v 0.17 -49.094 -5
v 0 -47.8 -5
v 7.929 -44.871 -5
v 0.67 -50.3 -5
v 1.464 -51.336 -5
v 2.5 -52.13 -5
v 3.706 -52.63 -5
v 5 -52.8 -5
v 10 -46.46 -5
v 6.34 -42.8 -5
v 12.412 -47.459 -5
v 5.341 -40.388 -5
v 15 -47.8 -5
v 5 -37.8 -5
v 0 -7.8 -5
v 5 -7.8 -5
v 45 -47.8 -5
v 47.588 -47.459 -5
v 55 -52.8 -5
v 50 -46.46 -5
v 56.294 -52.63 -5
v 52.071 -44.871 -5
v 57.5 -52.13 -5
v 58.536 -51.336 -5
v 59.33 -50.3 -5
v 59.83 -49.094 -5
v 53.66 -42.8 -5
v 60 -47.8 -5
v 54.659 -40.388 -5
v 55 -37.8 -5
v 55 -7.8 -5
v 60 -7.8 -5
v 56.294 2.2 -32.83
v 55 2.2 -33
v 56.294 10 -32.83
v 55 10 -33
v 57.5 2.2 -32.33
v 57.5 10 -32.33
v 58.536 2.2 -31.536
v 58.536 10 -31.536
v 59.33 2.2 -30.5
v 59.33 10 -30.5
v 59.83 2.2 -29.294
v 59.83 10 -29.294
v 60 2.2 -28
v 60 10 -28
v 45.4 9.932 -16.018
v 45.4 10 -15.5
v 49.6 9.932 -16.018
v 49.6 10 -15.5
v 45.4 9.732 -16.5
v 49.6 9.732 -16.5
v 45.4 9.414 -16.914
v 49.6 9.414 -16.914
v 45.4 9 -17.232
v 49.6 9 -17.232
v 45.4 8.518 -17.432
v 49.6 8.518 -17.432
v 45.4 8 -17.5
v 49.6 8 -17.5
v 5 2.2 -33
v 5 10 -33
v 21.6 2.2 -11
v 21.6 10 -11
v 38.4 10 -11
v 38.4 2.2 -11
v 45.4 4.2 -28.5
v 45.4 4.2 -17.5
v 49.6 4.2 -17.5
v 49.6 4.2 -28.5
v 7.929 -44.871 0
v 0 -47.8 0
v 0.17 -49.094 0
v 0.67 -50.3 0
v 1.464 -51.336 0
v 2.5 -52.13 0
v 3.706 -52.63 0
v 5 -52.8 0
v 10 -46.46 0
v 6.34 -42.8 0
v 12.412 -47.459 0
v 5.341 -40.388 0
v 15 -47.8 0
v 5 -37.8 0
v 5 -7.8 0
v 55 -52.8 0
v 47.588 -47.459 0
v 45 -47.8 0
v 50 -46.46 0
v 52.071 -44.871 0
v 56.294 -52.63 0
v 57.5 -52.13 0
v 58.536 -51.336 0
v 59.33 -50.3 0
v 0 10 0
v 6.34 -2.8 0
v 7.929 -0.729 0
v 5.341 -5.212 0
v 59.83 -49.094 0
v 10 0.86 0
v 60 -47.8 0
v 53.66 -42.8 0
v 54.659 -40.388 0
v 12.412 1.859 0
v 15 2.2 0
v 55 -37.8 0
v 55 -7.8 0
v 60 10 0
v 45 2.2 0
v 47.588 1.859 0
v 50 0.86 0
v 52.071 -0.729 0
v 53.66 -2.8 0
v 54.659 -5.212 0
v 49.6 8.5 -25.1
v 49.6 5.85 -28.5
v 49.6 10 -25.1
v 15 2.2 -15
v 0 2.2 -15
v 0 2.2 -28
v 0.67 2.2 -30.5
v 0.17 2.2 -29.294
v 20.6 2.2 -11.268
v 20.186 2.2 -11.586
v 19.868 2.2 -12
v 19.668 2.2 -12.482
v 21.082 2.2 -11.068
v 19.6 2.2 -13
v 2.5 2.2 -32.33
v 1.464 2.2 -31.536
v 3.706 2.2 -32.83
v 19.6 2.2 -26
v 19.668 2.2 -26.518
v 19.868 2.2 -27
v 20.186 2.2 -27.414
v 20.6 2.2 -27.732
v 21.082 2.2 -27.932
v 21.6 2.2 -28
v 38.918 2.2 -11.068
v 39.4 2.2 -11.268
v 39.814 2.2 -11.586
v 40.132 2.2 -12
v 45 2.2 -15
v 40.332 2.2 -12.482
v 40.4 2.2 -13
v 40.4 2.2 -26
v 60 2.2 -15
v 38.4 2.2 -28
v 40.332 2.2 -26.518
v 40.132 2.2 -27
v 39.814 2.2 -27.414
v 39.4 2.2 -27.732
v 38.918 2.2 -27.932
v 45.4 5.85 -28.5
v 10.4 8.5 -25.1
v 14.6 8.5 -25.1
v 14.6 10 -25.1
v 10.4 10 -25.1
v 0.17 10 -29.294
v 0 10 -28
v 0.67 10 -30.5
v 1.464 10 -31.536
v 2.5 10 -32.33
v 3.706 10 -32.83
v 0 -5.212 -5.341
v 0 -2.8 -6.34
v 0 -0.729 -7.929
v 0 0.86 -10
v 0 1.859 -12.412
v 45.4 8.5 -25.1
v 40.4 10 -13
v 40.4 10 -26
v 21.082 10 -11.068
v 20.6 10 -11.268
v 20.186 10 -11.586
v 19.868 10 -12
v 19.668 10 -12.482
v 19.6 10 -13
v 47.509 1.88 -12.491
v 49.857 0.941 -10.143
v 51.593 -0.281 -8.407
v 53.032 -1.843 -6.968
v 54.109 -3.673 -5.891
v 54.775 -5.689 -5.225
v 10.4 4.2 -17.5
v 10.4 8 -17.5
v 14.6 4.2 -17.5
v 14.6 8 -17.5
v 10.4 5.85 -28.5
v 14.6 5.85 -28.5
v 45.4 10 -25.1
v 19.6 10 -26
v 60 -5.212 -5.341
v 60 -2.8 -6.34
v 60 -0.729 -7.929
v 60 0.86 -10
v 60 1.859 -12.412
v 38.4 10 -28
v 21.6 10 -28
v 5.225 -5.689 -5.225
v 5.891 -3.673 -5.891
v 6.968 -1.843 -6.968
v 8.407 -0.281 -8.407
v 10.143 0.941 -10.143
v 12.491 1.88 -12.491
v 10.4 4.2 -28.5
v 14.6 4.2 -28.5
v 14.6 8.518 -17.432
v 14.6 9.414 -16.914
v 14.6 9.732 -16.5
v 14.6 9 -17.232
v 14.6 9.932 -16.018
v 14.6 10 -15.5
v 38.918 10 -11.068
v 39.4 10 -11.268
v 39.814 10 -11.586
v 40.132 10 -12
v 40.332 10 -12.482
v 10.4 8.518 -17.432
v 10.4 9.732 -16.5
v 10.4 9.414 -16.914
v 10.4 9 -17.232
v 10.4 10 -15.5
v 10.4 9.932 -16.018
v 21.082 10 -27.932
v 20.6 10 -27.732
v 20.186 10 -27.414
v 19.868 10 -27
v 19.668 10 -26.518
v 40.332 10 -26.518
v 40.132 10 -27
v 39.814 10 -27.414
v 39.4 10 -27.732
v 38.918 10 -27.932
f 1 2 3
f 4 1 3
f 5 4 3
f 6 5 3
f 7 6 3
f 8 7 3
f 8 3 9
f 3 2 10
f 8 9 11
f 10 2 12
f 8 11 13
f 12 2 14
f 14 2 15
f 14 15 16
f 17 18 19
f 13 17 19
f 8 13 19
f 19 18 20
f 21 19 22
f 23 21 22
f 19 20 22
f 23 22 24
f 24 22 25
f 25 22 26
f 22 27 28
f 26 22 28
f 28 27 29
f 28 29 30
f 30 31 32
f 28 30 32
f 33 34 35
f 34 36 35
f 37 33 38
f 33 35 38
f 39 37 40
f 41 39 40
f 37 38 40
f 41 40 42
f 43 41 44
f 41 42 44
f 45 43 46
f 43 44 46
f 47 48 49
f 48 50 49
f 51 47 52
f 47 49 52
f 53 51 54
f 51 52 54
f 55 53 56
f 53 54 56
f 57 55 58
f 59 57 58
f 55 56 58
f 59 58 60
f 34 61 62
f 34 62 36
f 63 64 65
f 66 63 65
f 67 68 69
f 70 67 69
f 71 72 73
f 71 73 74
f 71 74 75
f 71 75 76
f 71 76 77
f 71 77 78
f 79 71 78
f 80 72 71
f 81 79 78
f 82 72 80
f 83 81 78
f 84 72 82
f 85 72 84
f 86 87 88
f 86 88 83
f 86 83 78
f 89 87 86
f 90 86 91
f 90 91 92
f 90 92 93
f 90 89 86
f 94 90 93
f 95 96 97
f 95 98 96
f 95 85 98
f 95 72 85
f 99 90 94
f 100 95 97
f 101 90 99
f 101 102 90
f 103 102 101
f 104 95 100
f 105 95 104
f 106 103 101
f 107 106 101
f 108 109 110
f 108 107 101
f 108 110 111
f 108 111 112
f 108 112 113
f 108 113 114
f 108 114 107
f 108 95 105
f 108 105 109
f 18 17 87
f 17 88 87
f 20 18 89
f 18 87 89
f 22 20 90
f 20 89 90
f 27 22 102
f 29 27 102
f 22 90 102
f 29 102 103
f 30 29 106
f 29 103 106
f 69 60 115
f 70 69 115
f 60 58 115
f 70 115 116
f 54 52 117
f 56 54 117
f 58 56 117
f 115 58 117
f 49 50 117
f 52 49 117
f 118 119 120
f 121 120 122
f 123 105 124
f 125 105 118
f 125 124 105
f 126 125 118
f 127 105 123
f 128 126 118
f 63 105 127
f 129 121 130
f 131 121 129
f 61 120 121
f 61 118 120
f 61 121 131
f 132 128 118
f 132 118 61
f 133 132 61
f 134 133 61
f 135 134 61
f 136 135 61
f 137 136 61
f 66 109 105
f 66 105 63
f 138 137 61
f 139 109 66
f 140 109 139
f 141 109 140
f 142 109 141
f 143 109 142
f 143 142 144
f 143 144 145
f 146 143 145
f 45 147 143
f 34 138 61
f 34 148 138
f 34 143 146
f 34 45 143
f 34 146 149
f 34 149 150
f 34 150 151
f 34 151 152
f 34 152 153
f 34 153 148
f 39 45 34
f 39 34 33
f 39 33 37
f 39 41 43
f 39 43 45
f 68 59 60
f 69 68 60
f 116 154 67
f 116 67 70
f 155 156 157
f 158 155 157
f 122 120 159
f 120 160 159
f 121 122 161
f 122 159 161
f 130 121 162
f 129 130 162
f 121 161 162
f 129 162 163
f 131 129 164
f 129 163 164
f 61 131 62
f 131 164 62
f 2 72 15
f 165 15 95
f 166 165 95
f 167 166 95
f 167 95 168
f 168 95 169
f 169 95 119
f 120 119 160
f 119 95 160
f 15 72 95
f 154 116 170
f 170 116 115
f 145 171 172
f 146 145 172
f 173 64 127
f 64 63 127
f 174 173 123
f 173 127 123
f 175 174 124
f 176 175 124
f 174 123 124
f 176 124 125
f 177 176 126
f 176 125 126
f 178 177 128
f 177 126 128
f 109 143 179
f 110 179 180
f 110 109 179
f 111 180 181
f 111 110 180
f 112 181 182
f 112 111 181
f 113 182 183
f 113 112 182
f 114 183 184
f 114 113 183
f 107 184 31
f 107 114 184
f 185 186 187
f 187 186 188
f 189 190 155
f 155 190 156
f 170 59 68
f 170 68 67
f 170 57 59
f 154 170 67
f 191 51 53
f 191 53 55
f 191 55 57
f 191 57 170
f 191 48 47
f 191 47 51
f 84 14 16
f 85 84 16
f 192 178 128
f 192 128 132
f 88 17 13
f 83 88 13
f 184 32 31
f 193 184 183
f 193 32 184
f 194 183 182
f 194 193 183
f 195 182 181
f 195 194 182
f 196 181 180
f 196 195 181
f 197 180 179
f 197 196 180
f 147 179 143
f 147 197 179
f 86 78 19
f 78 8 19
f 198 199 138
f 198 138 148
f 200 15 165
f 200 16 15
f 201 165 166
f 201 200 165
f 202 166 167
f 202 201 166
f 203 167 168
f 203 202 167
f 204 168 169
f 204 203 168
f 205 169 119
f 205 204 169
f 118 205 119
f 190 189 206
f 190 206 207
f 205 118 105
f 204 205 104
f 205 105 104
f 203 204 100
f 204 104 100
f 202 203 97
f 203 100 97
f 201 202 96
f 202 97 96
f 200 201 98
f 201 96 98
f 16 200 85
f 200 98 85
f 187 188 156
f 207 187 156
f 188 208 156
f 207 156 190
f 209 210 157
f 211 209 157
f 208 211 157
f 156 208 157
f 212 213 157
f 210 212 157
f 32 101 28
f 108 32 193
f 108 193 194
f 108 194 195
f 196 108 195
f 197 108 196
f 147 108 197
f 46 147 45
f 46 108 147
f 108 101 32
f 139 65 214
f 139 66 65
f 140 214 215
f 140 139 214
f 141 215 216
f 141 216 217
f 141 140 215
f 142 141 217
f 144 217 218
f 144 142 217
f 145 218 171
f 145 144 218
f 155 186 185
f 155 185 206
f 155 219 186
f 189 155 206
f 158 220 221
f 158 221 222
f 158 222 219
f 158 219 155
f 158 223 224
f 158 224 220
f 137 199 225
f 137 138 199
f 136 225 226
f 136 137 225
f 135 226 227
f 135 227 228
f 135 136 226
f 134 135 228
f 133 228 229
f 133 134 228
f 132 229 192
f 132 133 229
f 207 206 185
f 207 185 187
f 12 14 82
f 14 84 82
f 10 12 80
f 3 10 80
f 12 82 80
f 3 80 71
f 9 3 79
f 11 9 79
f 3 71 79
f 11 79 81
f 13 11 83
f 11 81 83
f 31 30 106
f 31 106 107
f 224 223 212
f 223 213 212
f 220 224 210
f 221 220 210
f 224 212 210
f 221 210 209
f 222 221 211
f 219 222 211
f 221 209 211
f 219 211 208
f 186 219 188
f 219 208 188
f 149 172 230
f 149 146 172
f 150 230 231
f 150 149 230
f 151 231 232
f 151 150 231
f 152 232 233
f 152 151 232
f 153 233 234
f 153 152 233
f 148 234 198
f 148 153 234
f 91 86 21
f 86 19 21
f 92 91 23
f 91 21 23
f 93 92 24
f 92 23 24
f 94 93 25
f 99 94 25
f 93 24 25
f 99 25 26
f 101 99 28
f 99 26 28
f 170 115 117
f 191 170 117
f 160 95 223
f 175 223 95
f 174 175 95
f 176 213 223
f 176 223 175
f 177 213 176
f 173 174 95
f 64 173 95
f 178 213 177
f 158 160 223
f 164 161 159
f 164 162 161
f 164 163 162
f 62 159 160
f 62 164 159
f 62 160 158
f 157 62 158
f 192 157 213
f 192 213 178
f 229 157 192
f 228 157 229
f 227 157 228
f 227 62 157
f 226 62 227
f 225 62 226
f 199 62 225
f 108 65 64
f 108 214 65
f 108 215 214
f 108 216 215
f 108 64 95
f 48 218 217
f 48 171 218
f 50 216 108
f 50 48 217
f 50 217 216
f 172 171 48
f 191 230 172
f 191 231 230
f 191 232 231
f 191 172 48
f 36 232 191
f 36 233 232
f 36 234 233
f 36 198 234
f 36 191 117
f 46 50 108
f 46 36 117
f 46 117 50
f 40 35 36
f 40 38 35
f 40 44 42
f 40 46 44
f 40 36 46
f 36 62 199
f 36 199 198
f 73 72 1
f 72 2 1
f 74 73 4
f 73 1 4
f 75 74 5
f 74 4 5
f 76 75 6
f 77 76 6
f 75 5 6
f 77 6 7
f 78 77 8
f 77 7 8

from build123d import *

# Parameters (mm, degrees)
SKETCH1_W               = 60
SKETCH1_H               = 33
BOSS_EXTRUDE1_DEPTH     = 10
SKETCH2_W               = 4.2
SKETCH2_H               = 11
CUT_EXTRUDE1_DEPTH      = 5.8
BOSS_EXTRUDE2_START     = -45.4
BOSS_EXTRUDE2_DEPTH     = 55.8
SKETCH4_W               = 33
SKETCH4_H               = 2.2
CUT_EXTRUDE2_DEPTH      = 1
CUT_EXTRUDE2_DEPTH_BACK = 61
FILLET1_R               = 2
SKETCH7_W               = 20.8
SKETCH7_H               = 17
CUT_EXTRUDE4_DEPTH      = 16
FILLET2_R               = 2
BOSS_EXTRUDE4_START     = -7.8
SKETCH5_W               = 60
SKETCH5_H               = 5
BOSS_EXTRUDE4_DEPTH     = 55
SKETCH8_W               = 50
SKETCH8_H               = 50
CUT_EXTRUDE5_DEPTH      = 52.15
FILLET3_R               = 10
FILLET4_R               = 5
FILLET6_R               = 5


with BuildPart() as part:
    # Sketch1 → Boss-Extrude1 (new body)
    with BuildSketch(Plane(origin=(0, 0, 0), x_dir=(1, 0, 0), z_dir=(0, 1, 0))):
        with Locations((30, 16.5)):
            Rectangle(SKETCH1_W, SKETCH1_H)
    extrude(amount=BOSS_EXTRUDE1_DEPTH)

    # Sketch2 → Cut-Extrude1 (cut)
    with BuildSketch(Plane(origin=(0, 10, 0), x_dir=(1, 0, 0), z_dir=(0, 1, 0))):
        with Locations((12.5, 23)):
            Rectangle(SKETCH2_W, SKETCH2_H)
        with Locations((47.5, 23)):
            Rectangle(SKETCH2_W, SKETCH2_H)
    extrude(amount=-CUT_EXTRUDE1_DEPTH, mode=Mode.SUBTRACT)

    # Sketch3 → Boss-Extrude2 (add)
    with BuildSketch(Plane.ZY.offset(-14.6).offset(BOSS_EXTRUDE2_START)):
        Polygon((-28.5, 5.85), (-25.1, 8.5), (-25.1, 10), (-28.5, 10), align=None)
    extrude(amount=BOSS_EXTRUDE2_DEPTH)

    # Sketch4 → Cut-Extrude2 (cut, two sides)
    with BuildSketch(Plane(origin=(60, 0, 0), x_dir=(0, 0, -1), z_dir=(1, 0, 0))) as cut_extrude2_sk:
        with Locations((16.5, 1.1)):
            Rectangle(SKETCH4_W, SKETCH4_H)
    extrude(amount=CUT_EXTRUDE2_DEPTH, mode=Mode.SUBTRACT)
    extrude(cut_extrude2_sk.sketch, amount=-CUT_EXTRUDE2_DEPTH_BACK, mode=Mode.SUBTRACT)

    # Fillet1
    fillet1_edges = [part.edges().sort_by_distance(p)[0] for p in [
        (12.5, 10, -17.5),
        (47.5, 10, -17.5),
    ]]
    fillet(fillet1_edges, radius=FILLET1_R)

    # Sketch7 → Cut-Extrude4 (cut)
    with BuildSketch(Plane(origin=(0, 10, 0), x_dir=(1, 0, 0), z_dir=(0, 1, 0))):
        with Locations((30, 19.5)):
            Rectangle(SKETCH7_W, SKETCH7_H)
    extrude(amount=-CUT_EXTRUDE4_DEPTH, mode=Mode.SUBTRACT)

    # Fillet2
    fillet2_edges = [part.edges().sort_by_distance(p)[0] for p in [
        (19.6, 6.1, -11),
        (19.6, 6.1, -28),
        (40.4, 6.1, -28),
        (40.4, 6.1, -11),
    ]]
    fillet(fillet2_edges, radius=FILLET2_R)

    # Sketch5 → Boss-Extrude4 (add)
    with BuildSketch(Plane(origin=(0, 10, 0), x_dir=(1, 0, 0), z_dir=(0, 1, 0)).offset(BOSS_EXTRUDE4_START)):
        with Locations((30, 2.5)):
            Rectangle(SKETCH5_W, SKETCH5_H)
    extrude(amount=-BOSS_EXTRUDE4_DEPTH)

    # Sketch8 → Cut-Extrude5 (cut)
    with BuildSketch(Plane(origin=(0, 0, -5), x_dir=(-1, 0, 0), z_dir=(0, 0, -1))):
        with Locations((-30, -22.8)):
            Rectangle(SKETCH8_W, SKETCH8_H)
    extrude(amount=-CUT_EXTRUDE5_DEPTH, mode=Mode.SUBTRACT)

    # Fillet3
    fillet3_edges = [part.edges().sort_by_distance(p)[0] for p in [
        (57.5, 2.2, -5),
        (2.5, 2.2, -5),
        (55, -47.8, -2.5),
        (55, 2.2, -2.5),
        (5, 2.2, -2.5),
        (5, -47.8, -2.5),
    ]]
    fillet(fillet3_edges, radius=FILLET3_R)

    # Fillet4
    fillet4_edges = [part.edges().sort_by_distance(p)[0] for p in [
        (60, -52.8, -2.5),
        (0, -52.8, -2.5),
    ]]
    fillet(fillet4_edges, radius=FILLET4_R)

    # Fillet6
    fillet6_edges = [part.edges().sort_by_distance(p)[0] for p in [
        (0, 6.1, -33),
        (60, 6.1, -33),
    ]]
    fillet(fillet6_edges, radius=FILLET6_R)


solid = part.part
